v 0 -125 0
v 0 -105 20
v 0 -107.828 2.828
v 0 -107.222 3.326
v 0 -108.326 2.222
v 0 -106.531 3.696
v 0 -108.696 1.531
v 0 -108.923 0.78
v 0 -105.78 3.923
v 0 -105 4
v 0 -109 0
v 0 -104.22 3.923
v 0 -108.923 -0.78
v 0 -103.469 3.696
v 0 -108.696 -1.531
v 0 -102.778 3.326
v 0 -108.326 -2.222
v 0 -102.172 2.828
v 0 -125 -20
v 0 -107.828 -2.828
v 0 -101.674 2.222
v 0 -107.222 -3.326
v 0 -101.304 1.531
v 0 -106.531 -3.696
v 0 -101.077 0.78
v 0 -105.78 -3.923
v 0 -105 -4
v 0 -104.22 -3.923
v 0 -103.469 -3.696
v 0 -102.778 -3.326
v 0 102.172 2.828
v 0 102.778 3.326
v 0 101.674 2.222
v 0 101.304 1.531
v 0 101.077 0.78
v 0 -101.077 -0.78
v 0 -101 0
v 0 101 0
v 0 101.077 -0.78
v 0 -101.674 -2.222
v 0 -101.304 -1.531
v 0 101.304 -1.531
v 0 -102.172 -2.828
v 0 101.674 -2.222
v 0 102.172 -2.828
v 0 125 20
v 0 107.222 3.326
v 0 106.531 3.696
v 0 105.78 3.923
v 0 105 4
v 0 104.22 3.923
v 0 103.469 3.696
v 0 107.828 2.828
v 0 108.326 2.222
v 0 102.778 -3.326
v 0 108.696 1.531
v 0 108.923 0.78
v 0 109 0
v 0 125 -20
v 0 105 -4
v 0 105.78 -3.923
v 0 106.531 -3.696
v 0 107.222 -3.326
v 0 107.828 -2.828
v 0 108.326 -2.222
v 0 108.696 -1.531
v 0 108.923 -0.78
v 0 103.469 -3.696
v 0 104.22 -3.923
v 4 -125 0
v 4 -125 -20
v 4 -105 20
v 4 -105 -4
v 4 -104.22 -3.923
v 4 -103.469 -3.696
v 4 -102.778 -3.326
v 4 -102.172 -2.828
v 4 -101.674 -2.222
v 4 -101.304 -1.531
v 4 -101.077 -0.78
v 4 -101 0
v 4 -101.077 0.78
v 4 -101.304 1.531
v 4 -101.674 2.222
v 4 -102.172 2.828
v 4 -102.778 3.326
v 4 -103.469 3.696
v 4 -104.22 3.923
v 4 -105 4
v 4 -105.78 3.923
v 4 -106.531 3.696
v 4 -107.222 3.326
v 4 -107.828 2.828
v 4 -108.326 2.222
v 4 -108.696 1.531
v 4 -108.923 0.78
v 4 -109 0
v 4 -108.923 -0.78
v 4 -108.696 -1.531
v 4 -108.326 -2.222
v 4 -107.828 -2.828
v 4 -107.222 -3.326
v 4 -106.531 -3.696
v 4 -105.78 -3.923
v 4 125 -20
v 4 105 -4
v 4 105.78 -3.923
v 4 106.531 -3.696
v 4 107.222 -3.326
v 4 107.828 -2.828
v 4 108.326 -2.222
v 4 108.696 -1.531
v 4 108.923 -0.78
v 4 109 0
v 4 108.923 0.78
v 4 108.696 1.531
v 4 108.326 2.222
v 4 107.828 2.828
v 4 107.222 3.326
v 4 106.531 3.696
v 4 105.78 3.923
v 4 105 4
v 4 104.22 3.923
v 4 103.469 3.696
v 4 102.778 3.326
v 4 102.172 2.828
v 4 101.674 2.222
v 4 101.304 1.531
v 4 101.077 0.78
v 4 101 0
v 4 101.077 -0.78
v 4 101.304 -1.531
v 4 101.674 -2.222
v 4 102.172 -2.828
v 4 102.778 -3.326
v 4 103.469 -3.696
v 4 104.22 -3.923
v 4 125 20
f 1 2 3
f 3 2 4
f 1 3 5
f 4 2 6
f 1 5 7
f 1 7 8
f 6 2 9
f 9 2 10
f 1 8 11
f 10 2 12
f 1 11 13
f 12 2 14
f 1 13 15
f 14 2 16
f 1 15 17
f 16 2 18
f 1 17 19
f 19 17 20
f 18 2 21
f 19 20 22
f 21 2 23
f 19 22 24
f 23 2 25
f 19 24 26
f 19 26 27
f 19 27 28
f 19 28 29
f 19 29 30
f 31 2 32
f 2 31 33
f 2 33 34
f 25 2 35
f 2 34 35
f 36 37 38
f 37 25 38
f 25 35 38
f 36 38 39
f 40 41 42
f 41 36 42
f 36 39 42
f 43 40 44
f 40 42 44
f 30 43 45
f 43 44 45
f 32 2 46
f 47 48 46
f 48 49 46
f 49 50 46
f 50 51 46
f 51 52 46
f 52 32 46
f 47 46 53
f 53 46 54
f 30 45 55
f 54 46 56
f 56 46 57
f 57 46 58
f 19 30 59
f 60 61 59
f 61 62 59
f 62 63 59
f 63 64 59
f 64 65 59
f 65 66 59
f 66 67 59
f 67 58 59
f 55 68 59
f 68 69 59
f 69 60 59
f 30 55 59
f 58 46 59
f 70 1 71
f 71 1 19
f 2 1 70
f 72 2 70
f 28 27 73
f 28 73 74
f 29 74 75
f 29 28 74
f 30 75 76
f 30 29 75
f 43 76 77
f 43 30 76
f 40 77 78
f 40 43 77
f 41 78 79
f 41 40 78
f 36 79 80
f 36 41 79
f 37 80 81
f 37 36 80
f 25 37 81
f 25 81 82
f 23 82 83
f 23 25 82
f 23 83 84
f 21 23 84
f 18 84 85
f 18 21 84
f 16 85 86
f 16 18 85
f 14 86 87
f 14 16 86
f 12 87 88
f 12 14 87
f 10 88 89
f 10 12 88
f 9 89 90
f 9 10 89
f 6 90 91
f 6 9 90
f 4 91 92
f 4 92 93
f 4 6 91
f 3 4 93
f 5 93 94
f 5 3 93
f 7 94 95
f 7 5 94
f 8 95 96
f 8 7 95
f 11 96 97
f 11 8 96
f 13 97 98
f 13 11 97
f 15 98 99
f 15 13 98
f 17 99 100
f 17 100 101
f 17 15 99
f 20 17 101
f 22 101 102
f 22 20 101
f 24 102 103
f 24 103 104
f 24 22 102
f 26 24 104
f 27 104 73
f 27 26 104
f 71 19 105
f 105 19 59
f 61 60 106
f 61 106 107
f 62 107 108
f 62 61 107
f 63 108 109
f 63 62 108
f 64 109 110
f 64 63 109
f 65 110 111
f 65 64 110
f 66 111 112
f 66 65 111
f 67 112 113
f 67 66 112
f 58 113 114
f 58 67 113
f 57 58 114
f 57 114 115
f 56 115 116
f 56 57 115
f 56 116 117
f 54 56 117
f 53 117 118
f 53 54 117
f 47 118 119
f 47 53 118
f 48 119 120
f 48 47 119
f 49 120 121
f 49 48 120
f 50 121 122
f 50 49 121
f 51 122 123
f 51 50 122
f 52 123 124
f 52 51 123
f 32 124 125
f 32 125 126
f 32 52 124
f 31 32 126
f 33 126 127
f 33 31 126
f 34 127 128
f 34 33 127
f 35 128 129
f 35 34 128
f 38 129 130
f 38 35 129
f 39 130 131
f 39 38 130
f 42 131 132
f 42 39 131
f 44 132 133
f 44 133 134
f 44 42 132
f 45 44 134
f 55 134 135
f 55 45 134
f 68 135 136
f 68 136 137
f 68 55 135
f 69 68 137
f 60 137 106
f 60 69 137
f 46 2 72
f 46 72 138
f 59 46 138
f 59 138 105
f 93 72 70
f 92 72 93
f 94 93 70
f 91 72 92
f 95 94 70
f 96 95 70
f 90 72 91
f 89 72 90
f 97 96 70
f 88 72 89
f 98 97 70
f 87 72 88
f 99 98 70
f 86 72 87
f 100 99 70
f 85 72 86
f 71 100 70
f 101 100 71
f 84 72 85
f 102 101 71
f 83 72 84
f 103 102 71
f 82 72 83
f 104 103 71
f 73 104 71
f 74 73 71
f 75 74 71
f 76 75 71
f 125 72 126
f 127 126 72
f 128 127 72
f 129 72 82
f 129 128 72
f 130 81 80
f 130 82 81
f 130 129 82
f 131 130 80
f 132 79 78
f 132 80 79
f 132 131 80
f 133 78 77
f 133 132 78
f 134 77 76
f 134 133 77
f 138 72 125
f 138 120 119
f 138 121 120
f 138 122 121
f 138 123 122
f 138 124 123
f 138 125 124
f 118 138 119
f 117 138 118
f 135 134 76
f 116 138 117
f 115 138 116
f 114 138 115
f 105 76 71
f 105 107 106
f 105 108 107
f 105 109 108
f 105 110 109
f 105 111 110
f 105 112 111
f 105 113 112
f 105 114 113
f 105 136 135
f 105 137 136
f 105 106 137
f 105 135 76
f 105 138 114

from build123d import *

# Parameters (mm, degrees)
SKETCH1_W           = 40
SKETCH1_H           = 250
SKETCH1_R           = 4
BOSS_EXTRUDE1_DEPTH = 4
CHAMFER3_SIZE       = 20


with BuildPart() as part:
    # Sketch1 → Boss-Extrude1 (new body)
    with BuildSketch(Plane(origin=(0, 0, 0), x_dir=(0, 0, -1), z_dir=(1, 0, 0))):
        Rectangle(SKETCH1_W, SKETCH1_H)
        with Locations((0, 105)):
            Circle(SKETCH1_R, mode=Mode.SUBTRACT)
        with Locations((0, -105)):
            Circle(SKETCH1_R, mode=Mode.SUBTRACT)
    extrude(amount=BOSS_EXTRUDE1_DEPTH)

    # Chamfer3
    chamfer3_edges = [part.edges().sort_by_distance(p)[0] for p in [
        (2, -125, 20),
    ]]
    chamfer(chamfer3_edges, length=CHAMFER3_SIZE)


solid = part.part
